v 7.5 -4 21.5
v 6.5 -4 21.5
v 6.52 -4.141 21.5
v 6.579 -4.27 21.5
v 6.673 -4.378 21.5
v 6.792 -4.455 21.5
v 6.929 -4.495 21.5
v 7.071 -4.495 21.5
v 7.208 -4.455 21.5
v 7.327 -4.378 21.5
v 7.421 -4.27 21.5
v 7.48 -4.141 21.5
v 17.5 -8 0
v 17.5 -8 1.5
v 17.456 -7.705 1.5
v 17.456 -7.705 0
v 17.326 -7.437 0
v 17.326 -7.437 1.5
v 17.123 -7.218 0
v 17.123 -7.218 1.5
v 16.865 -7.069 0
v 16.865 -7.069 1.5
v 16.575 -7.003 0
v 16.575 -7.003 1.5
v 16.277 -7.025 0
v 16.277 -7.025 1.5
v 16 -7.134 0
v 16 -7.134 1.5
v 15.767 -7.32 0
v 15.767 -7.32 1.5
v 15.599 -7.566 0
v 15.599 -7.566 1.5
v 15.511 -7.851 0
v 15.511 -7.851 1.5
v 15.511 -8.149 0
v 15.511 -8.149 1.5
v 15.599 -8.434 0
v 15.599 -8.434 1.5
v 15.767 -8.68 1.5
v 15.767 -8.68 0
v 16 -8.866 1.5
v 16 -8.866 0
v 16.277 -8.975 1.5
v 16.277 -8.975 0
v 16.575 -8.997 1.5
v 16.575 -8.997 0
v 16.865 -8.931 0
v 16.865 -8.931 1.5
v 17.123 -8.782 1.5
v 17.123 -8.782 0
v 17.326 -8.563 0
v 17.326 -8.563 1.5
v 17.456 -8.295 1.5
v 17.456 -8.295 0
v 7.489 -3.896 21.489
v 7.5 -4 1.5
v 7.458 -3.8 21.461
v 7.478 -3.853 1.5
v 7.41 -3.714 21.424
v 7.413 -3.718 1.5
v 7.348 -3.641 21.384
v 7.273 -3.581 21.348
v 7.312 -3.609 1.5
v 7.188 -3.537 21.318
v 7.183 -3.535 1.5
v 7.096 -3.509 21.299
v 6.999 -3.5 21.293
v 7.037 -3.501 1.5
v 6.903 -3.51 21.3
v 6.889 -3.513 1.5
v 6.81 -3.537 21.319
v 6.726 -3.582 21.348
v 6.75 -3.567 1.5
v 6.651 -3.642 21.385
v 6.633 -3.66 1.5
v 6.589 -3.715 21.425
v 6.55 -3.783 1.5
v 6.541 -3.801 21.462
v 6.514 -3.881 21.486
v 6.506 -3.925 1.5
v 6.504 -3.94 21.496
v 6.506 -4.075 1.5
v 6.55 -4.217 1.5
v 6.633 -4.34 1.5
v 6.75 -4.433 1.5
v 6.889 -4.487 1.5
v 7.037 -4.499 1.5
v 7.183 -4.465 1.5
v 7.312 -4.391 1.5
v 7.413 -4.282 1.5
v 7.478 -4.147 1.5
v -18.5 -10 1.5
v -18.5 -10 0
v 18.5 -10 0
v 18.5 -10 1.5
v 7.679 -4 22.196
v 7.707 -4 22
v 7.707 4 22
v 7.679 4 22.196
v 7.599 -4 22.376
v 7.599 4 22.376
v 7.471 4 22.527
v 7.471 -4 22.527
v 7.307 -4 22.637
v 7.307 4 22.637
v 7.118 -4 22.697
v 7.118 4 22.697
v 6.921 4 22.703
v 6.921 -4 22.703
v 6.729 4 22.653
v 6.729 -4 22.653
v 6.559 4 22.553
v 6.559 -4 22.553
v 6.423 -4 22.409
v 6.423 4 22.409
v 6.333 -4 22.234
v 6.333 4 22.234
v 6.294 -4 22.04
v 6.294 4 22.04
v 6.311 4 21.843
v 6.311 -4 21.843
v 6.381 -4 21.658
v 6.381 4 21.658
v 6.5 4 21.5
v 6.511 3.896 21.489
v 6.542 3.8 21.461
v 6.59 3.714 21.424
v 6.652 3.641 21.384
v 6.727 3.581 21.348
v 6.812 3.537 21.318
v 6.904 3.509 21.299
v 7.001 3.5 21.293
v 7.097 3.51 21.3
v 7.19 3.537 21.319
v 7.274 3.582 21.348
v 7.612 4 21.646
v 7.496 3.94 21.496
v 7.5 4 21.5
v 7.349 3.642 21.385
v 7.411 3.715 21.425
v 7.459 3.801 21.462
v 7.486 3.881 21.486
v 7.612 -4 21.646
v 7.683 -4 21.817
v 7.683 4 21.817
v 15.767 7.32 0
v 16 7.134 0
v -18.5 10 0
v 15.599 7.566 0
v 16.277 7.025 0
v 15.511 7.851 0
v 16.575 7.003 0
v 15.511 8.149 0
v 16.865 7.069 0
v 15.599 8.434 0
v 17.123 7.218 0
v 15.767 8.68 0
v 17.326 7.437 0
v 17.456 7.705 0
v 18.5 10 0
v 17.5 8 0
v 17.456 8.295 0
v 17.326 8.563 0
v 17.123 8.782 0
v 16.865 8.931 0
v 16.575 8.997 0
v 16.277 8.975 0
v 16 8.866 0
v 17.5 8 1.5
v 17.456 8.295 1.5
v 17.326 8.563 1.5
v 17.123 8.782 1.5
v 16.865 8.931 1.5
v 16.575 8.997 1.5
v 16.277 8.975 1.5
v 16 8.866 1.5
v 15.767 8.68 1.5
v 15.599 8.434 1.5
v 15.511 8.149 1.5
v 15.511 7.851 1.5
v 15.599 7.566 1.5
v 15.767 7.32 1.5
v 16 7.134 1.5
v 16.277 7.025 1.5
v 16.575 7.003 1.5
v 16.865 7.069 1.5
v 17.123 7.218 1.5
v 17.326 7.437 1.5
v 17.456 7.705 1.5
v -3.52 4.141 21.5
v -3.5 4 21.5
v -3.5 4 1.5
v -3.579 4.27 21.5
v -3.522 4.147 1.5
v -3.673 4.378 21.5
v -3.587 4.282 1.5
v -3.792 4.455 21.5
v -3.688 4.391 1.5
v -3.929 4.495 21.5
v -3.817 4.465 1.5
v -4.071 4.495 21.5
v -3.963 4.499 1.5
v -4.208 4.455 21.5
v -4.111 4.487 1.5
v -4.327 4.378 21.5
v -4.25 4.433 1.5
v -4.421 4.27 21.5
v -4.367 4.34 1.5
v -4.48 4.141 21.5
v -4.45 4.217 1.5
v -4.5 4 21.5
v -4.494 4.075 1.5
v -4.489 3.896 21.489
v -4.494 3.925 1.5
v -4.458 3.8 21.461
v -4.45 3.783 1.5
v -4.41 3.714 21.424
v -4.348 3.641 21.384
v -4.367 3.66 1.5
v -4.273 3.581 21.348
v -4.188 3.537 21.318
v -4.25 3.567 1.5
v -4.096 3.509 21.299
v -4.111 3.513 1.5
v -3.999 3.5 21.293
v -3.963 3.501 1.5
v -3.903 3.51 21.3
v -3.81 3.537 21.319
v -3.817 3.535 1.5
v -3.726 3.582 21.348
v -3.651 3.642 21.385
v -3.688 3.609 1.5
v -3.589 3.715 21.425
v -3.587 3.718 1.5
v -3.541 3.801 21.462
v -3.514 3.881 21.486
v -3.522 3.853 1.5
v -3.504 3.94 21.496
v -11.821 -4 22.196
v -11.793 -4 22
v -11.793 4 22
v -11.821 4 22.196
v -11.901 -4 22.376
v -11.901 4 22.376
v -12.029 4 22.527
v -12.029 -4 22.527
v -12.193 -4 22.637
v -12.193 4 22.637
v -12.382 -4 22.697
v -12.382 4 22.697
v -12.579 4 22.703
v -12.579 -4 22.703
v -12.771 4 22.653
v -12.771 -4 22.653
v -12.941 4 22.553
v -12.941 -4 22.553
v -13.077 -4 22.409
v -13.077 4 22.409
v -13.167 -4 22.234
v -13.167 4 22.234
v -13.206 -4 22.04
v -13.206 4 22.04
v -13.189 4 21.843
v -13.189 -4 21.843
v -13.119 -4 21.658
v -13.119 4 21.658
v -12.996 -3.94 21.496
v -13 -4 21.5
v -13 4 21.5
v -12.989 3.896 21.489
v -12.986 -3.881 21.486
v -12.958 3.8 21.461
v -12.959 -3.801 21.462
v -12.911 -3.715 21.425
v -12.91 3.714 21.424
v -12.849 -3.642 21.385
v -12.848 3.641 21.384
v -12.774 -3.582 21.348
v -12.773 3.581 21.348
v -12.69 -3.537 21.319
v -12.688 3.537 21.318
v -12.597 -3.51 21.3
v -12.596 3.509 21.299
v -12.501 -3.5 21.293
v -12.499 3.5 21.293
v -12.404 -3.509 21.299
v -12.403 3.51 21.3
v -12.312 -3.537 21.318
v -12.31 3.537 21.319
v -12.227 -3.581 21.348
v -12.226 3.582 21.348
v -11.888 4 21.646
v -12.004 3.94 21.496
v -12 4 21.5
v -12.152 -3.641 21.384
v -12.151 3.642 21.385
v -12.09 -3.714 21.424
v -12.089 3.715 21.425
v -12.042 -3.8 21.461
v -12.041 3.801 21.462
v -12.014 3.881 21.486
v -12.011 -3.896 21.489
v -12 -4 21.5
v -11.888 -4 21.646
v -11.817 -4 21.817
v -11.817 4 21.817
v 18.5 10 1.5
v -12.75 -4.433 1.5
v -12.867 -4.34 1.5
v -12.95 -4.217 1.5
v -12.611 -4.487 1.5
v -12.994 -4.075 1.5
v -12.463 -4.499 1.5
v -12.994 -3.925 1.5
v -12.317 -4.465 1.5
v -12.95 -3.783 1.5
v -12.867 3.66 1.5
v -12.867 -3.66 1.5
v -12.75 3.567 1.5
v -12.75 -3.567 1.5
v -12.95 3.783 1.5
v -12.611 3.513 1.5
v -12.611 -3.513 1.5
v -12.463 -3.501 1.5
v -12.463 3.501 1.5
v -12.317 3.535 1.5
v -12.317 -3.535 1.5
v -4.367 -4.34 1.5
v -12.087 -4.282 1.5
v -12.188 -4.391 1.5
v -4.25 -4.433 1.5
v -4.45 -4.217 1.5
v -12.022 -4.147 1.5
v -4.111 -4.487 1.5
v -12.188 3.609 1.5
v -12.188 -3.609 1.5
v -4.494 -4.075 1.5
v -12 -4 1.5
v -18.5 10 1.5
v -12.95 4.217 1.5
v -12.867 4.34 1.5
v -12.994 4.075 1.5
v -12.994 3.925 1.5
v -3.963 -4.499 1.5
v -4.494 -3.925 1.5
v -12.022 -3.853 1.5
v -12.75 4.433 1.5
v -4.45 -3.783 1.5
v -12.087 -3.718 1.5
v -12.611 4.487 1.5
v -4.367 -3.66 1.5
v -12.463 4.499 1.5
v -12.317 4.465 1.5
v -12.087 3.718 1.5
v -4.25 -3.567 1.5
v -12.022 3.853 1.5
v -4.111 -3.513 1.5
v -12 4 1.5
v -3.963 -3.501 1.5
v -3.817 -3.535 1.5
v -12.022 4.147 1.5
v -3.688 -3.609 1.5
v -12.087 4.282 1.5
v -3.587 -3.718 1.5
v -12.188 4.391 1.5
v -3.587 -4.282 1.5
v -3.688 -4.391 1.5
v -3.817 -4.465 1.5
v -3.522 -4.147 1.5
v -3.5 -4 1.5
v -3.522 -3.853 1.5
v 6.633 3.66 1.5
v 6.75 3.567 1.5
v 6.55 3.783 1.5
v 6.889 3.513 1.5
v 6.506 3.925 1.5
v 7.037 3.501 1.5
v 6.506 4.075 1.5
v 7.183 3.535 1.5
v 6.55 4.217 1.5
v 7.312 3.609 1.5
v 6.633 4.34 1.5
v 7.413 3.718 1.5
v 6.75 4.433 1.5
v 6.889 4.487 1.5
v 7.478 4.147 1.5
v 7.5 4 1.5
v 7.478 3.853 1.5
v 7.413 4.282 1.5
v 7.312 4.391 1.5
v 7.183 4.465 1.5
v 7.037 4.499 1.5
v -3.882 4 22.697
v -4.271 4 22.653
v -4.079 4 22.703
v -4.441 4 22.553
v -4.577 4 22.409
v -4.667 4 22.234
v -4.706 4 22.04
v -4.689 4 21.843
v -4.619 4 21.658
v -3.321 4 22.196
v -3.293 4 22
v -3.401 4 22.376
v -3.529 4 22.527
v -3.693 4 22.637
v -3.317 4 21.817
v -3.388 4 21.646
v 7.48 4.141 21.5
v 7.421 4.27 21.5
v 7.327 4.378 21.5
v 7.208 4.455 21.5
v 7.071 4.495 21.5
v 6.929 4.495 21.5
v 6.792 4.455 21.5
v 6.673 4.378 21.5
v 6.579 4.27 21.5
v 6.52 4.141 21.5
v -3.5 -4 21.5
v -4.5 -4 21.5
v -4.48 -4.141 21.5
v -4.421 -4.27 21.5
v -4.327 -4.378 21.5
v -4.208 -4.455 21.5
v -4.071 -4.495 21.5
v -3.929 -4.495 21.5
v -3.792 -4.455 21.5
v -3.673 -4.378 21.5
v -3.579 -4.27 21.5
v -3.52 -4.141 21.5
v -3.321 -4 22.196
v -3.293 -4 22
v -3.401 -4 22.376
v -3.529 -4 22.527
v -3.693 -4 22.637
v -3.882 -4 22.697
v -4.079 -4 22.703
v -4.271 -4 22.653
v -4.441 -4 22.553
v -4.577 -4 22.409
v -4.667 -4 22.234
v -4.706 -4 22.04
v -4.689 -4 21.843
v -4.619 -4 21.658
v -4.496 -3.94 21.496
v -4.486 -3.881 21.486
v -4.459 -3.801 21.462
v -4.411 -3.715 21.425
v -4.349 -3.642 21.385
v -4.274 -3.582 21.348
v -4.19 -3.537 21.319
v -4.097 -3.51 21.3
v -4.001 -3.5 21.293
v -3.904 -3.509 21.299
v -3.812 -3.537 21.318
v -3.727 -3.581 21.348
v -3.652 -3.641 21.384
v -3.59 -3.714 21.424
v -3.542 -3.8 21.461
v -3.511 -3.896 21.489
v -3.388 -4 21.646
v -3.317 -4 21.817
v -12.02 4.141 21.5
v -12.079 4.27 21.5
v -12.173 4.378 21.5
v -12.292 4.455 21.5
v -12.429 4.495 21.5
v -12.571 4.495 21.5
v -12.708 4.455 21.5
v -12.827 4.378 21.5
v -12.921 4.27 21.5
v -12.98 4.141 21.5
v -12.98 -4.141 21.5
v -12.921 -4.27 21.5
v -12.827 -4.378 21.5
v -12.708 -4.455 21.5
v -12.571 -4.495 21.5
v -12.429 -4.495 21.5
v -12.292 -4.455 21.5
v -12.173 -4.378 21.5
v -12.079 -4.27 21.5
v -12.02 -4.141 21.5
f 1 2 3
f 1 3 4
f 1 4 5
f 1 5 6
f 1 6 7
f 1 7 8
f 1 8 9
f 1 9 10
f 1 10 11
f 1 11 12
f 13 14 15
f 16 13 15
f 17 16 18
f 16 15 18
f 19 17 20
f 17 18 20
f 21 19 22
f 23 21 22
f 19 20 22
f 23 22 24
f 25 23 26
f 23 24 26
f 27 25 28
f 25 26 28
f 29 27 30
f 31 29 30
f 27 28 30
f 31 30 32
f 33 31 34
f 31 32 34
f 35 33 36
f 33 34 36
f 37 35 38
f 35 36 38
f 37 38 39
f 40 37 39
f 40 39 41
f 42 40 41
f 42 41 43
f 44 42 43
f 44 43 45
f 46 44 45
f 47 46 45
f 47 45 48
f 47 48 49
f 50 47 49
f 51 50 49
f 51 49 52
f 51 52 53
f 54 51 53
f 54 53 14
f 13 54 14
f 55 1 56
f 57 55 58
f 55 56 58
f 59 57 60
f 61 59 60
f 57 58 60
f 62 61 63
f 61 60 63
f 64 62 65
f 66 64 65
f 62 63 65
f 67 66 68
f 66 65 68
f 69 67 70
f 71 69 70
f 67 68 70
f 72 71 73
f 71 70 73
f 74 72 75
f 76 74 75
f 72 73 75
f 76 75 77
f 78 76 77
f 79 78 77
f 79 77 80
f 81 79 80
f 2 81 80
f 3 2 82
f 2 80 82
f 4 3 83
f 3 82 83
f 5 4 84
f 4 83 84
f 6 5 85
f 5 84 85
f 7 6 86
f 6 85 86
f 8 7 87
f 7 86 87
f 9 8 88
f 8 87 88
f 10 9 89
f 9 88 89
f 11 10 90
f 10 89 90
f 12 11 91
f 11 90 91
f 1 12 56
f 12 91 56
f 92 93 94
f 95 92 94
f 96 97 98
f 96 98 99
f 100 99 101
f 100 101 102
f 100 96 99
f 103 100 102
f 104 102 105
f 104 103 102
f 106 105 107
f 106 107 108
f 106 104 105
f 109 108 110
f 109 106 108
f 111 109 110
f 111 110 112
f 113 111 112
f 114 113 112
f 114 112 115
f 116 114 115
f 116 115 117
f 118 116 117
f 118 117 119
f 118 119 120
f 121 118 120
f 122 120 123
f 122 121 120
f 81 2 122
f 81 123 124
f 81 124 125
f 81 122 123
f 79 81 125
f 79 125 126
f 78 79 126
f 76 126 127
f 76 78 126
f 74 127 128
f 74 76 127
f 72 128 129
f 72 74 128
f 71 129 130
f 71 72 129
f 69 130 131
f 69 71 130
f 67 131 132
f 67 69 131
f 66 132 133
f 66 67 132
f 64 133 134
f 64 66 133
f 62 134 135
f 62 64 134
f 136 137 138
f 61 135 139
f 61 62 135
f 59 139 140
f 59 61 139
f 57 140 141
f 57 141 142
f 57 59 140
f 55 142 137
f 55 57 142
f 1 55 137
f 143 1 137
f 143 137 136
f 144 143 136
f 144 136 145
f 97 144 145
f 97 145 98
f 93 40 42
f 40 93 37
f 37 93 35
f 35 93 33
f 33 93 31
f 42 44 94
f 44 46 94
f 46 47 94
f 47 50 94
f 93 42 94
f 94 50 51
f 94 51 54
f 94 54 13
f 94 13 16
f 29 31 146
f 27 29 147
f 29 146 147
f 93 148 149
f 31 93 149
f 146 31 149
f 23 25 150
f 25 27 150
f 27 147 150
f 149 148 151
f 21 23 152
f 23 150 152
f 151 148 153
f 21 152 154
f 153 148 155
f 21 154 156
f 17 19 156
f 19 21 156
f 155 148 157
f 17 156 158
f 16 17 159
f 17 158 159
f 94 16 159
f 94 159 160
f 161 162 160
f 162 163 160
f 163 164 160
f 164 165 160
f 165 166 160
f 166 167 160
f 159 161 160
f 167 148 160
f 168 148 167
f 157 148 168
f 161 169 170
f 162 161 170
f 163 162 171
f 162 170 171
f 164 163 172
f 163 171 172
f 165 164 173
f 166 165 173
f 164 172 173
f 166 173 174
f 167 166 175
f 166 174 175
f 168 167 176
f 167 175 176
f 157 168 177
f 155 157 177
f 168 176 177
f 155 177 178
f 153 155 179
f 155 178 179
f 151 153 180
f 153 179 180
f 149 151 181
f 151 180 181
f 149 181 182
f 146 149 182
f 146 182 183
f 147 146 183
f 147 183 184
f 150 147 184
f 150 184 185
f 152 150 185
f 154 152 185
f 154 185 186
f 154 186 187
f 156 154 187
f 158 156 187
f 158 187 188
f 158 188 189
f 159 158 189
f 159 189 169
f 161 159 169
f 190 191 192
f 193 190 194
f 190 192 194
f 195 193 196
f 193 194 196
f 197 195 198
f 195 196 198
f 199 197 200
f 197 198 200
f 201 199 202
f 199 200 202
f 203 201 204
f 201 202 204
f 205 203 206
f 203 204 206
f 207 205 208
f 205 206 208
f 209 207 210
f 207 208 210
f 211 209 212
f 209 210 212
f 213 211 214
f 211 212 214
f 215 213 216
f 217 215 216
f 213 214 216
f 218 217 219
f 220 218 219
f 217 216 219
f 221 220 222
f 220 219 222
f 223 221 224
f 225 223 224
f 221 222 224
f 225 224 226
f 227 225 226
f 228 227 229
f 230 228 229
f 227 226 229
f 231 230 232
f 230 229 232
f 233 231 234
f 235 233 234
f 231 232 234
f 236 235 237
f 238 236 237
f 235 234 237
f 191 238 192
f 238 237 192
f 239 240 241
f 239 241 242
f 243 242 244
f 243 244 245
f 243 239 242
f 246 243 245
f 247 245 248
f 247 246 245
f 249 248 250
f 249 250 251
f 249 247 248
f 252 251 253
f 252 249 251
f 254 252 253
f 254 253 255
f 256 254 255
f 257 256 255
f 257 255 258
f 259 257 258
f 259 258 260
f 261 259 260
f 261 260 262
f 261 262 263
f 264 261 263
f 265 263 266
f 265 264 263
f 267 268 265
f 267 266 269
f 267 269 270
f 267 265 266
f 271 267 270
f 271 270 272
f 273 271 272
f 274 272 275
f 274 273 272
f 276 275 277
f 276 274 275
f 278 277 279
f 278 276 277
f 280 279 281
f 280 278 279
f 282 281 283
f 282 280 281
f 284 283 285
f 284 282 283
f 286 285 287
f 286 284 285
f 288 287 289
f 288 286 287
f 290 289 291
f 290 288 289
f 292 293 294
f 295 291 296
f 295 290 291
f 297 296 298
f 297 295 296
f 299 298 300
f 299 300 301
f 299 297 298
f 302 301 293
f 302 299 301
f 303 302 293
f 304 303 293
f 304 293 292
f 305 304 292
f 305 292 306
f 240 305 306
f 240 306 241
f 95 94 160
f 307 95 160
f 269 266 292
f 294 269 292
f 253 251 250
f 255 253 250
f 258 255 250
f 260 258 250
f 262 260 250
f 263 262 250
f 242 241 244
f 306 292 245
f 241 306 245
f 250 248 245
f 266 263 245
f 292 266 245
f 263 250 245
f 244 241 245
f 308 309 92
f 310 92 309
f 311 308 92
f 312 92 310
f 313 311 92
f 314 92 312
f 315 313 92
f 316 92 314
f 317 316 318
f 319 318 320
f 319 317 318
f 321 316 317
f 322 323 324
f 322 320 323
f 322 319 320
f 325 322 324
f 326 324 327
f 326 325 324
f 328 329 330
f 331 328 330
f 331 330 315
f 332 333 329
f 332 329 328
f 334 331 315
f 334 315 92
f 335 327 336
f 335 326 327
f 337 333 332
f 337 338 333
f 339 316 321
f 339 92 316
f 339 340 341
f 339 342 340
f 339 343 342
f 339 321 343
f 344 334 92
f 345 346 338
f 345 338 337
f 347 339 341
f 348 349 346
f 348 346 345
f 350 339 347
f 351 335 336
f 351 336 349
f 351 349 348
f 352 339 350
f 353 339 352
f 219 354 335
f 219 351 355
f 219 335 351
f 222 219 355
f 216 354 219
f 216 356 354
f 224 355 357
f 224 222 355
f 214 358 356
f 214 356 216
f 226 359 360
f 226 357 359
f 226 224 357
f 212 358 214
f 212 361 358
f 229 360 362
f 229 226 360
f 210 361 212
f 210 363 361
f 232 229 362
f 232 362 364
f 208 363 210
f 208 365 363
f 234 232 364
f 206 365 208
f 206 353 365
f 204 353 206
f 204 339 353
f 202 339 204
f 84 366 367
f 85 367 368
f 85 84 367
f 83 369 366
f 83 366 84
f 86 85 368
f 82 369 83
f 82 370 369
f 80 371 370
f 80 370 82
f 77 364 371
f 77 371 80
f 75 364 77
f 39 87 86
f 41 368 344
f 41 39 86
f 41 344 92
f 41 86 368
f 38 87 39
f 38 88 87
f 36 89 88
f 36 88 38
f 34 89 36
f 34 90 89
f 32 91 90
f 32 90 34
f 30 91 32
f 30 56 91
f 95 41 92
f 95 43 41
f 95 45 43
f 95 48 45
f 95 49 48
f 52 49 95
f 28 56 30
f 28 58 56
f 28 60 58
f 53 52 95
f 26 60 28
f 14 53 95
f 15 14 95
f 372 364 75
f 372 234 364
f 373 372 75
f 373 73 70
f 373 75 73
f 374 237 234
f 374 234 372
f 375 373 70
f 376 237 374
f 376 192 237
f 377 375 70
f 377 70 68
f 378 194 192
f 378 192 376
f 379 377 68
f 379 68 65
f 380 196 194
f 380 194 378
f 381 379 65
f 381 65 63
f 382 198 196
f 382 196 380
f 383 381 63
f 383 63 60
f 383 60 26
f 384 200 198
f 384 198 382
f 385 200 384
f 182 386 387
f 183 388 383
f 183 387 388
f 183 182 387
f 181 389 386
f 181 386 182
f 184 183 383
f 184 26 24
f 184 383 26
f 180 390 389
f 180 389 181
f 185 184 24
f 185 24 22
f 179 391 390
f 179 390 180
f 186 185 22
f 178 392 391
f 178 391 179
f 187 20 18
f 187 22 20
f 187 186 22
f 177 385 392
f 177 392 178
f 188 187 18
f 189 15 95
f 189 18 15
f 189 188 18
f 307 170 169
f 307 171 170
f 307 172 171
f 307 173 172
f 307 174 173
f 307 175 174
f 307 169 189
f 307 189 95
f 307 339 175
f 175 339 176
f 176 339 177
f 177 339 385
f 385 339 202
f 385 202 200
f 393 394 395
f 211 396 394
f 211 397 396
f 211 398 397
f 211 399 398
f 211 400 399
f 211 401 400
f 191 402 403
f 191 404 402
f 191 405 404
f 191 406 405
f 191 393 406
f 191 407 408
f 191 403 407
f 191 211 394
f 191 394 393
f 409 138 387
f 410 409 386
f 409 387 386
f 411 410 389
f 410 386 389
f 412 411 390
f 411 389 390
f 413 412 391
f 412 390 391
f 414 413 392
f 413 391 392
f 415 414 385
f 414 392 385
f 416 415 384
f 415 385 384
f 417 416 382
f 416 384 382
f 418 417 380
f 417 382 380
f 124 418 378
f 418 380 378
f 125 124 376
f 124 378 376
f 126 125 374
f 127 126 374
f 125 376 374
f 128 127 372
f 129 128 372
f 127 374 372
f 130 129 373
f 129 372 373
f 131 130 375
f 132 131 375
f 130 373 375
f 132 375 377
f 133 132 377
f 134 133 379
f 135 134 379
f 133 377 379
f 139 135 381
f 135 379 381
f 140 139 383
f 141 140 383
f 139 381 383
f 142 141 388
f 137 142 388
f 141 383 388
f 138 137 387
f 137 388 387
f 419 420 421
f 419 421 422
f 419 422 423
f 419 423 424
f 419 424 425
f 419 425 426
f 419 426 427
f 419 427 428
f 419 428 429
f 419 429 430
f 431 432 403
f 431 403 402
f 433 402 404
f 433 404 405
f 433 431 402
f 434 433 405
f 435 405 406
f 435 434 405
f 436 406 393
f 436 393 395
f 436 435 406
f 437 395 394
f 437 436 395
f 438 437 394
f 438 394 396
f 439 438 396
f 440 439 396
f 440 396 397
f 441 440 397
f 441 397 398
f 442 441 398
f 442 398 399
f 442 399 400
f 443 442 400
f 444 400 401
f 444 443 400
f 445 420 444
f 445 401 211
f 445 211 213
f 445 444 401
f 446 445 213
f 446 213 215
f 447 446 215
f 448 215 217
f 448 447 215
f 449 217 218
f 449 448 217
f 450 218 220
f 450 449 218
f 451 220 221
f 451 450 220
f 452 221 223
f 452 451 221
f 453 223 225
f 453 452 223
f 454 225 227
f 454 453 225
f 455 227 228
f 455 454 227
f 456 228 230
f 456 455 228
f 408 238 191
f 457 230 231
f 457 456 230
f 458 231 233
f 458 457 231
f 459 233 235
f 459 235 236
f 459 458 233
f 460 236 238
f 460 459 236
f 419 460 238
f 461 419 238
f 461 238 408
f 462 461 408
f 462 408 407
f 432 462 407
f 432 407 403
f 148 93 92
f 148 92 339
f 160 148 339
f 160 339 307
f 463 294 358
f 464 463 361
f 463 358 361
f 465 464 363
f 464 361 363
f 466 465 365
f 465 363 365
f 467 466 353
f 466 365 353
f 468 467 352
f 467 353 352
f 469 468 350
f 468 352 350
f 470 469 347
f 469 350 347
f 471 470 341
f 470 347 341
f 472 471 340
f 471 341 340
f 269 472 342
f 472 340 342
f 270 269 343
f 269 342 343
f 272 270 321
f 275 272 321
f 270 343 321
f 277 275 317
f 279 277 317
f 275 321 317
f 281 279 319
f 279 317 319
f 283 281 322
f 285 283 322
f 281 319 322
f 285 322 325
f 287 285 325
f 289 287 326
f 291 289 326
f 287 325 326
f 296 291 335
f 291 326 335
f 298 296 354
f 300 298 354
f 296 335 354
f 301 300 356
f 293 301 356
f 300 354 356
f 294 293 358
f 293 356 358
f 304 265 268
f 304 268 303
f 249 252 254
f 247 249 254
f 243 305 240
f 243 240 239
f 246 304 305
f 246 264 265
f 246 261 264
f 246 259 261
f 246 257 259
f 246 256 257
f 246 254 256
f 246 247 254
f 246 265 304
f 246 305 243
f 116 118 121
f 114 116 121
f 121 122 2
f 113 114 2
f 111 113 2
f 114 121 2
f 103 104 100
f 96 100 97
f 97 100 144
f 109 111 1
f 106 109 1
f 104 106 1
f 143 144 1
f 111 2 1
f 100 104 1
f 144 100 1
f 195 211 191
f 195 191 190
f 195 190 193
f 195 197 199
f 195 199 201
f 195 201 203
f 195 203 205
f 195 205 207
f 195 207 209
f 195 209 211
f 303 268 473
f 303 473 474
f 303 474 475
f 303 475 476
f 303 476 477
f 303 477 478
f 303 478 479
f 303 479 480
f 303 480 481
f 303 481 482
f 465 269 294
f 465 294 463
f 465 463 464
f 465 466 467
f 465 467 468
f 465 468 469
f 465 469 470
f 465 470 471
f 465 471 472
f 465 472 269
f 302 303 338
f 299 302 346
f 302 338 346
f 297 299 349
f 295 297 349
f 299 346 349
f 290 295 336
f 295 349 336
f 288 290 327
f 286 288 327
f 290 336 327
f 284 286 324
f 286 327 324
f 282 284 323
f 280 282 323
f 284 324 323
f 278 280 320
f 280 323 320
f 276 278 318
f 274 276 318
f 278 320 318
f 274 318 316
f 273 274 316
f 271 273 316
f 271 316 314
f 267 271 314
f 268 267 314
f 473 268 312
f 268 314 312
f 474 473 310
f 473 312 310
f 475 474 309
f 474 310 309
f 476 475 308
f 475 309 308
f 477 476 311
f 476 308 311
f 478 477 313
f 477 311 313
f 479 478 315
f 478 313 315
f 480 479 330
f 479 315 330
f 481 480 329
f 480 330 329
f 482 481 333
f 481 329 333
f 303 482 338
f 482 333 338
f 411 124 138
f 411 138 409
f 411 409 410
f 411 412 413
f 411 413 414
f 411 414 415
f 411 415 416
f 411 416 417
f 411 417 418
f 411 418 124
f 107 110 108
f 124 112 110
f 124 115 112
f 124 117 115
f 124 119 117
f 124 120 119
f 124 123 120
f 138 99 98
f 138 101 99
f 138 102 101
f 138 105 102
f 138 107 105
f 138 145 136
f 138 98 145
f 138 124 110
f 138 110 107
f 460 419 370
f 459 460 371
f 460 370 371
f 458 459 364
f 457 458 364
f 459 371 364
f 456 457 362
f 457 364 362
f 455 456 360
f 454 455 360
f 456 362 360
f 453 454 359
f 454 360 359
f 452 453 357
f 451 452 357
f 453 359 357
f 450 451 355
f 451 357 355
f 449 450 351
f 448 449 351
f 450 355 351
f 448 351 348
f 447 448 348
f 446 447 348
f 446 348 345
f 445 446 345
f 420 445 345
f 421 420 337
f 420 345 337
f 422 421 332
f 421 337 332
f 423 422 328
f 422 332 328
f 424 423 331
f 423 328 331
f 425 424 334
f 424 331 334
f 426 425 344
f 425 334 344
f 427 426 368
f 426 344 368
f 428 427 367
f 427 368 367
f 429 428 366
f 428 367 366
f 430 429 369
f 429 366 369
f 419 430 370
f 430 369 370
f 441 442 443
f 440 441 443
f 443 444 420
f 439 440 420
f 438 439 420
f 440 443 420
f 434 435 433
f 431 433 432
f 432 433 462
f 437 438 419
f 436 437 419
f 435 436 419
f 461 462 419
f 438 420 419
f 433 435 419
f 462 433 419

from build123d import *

# Parameters (mm, degrees)
ESBO_O1_W                = 37
ESBO_O1_H                = 20
RESSALTO_EXTRUS_O1_DEPTH = 1.5
ESBO_O2_R                = 1
CORTE_EXTRUS_O1_DEPTH    = 2.5
ESBO_O3_R                = 0.5
RESSALTO_EXTRUS_O2_DEPTH = 20
ESBO_O4_W                = 1
ESBO_O4_H                = 8
RESSALTO_EXTRUS_O3_DEPTH = 1
ESBO_O5_R                = 0.707106781
RESSALTO_EXTRUS_O4_DEPTH = 8


with BuildPart() as part:
    # Esboço1 → Ressalto-extrusão1 (new body)
    with BuildSketch(Plane.XY):
        Rectangle(ESBO_O1_W, ESBO_O1_H)
    extrude(amount=RESSALTO_EXTRUS_O1_DEPTH)

    # Esboço2 → Corte-extrusão1 (cut, through all)
    with BuildSketch(Plane.XY.offset(1.5)):
        with Locations((16.5, 8)):
            Circle(ESBO_O2_R)
        with Locations((16.5, -8)):
            Circle(ESBO_O2_R)
    extrude(amount=-CORTE_EXTRUS_O1_DEPTH, mode=Mode.SUBTRACT)

    # Esboço3 → Ressalto-extrusão2 (add)
    with BuildSketch(Plane.XY.offset(1.5)):
        with Locations((-12.5, 4)):
            Circle(ESBO_O3_R)
        with Locations((-4, 4)):
            Circle(ESBO_O3_R)
        with Locations((7, 4)):
            Circle(ESBO_O3_R)
        with Locations((7, -4)):
            Circle(ESBO_O3_R)
        with Locations((-4, -4)):
            Circle(ESBO_O3_R)
        with Locations((-12.5, -4)):
            Circle(ESBO_O3_R)
    extrude(amount=RESSALTO_EXTRUS_O2_DEPTH)

    # Esboço4 → Ressalto-extrusão3 (add)
    with BuildSketch(Plane.XY.offset(21.5)):
        with Locations((-12.5, 0)):
            Rectangle(ESBO_O4_W, ESBO_O4_H)
        with Locations((-4, 0)):
            Rectangle(ESBO_O4_W, ESBO_O4_H)
        with Locations((7, 0)):
            Rectangle(ESBO_O4_W, ESBO_O4_H)
    extrude(amount=RESSALTO_EXTRUS_O3_DEPTH)

    # Esboço5 → Ressalto-extrusão4 (add)
    with BuildSketch(Plane.XZ.offset(4)):
        with Locations((-12.5, 22)):
            Circle(ESBO_O5_R)
        with Locations((-4, 22)):
            Circle(ESBO_O5_R)
        with Locations((7, 22)):
            Circle(ESBO_O5_R)
    extrude(amount=-RESSALTO_EXTRUS_O4_DEPTH)


solid = part.part
